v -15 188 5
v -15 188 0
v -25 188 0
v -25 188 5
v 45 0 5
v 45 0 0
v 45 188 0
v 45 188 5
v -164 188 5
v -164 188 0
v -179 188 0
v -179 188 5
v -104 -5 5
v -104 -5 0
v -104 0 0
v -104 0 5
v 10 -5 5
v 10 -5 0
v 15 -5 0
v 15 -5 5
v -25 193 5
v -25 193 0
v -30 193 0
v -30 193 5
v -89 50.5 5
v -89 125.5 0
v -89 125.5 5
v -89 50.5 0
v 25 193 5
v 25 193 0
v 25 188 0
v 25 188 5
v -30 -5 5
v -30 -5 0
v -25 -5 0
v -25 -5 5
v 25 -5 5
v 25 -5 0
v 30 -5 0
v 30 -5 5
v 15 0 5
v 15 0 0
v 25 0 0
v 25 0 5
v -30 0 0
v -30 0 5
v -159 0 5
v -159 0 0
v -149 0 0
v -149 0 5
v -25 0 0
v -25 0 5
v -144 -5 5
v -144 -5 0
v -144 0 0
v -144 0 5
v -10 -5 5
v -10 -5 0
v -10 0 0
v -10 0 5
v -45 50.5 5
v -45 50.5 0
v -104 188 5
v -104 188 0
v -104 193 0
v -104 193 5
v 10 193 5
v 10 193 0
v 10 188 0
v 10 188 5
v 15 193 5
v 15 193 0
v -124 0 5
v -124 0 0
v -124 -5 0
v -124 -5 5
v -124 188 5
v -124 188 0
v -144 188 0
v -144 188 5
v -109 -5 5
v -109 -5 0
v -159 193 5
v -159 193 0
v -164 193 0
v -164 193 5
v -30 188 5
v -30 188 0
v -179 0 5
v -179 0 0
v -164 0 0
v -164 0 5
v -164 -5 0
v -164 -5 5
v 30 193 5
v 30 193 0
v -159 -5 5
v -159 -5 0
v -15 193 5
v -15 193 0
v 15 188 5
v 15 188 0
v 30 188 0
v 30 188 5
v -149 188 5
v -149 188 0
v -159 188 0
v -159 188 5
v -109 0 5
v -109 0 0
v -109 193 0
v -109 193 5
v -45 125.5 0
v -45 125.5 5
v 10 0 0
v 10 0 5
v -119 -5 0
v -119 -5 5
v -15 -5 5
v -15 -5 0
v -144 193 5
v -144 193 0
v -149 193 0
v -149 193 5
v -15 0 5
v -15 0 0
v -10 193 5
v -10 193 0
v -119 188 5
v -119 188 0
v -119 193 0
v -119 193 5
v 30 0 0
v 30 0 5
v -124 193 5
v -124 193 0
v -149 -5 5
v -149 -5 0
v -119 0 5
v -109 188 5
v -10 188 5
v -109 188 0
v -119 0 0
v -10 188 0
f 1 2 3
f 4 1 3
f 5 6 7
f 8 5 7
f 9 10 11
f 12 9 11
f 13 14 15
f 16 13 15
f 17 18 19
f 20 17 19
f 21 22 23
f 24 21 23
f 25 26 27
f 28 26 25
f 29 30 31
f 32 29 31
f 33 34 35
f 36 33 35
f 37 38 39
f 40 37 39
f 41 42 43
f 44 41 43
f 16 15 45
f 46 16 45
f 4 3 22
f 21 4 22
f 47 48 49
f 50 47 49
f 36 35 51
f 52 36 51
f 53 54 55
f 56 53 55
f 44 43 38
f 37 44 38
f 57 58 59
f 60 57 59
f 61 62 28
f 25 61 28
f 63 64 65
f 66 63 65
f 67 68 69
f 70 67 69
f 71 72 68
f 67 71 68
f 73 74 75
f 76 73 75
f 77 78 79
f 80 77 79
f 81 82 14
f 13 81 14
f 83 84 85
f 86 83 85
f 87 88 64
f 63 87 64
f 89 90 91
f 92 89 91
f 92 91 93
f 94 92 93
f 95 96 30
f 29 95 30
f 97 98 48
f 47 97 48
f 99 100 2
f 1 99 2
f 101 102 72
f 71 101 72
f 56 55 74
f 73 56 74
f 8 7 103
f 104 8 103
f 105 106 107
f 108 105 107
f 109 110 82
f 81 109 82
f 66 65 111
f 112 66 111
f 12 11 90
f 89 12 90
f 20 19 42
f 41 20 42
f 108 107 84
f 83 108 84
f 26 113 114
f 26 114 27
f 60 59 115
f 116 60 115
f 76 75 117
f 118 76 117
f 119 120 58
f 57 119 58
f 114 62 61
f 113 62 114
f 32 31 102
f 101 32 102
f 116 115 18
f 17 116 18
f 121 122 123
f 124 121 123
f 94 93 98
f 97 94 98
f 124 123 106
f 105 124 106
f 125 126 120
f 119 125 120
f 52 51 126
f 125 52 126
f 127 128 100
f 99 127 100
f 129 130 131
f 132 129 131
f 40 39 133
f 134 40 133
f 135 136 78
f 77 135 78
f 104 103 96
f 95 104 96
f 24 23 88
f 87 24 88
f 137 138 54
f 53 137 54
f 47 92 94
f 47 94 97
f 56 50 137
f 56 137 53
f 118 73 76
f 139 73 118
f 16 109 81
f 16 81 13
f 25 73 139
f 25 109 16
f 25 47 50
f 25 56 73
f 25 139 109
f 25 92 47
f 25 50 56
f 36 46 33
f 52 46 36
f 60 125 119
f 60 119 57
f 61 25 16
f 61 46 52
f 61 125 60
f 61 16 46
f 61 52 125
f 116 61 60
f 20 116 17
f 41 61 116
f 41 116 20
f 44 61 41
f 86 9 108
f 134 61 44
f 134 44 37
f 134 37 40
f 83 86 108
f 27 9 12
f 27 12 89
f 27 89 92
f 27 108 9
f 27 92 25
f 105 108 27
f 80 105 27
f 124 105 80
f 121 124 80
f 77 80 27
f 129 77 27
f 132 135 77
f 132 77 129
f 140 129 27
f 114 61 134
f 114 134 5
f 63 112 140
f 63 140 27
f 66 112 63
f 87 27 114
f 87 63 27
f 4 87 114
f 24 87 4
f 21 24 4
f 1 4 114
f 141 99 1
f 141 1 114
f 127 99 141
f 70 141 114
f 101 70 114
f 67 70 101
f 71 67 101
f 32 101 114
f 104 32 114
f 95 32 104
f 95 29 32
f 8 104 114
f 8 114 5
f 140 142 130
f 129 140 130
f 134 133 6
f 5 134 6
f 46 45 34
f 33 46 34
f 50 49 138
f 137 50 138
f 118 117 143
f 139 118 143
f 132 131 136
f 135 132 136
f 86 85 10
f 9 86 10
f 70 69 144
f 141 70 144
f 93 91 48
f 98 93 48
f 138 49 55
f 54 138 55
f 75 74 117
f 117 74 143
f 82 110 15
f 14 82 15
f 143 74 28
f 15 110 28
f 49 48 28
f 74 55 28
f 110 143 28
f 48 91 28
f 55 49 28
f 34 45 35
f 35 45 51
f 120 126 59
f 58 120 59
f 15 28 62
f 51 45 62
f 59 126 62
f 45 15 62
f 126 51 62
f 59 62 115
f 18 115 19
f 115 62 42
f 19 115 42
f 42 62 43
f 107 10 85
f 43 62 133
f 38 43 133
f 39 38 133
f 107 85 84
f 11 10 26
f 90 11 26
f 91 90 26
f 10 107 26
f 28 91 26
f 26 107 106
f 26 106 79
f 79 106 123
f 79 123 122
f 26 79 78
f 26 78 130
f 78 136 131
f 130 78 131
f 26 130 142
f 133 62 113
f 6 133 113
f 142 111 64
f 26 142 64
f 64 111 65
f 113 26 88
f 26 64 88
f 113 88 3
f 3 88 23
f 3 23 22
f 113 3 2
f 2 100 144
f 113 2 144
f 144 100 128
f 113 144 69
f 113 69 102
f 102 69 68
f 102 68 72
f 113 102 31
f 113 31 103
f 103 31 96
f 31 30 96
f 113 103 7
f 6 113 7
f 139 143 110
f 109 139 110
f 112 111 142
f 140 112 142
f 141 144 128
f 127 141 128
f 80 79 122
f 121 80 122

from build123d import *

# Parameters (mm, degrees)
BOSS_EXTRU_1_DEPTH = 5


with BuildPart() as part:
    # Esquisse1 → Boss.-Extru.1 (new body)
    with BuildSketch(Plane.XY):
        Polygon((-30, 188), (-45, 188), (-89, 188), (-104, 188), (-104, 193), (-109, 193), (-109, 188), (-114, 188), (-119, 188), (-119, 193), (-124, 193), (-124, 188), (-144, 188), (-144, 193), (-149, 193), (-149, 188), (-154, 188), (-159, 188), (-159, 193), (-164, 193), (-164, 188), (-179, 188), (-179, 0), (-164, 0), (-164, -5), (-159, -5), (-159, 0), (-154, 0), (-149, 0), (-149, -5), (-144, -5), (-144, 0), (-124, 0), (-124, -5), (-119, -5), (-119, 0), (-114, 0), (-109, 0), (-109, -5), (-104, -5), (-104, 0), (-89, 0), (-45, 0), (-30, 0), (-30, -5), (-25, -5), (-25, 0), (-20, 0), (-15, 0), (-15, -5), (-10, -5), (-10, 0), (10, 0), (10, -5), (15, -5), (15, 0), (20, 0), (25, 0), (25, -5), (30, -5), (30, 0), (45, 0), (45, 188), (30, 188), (30, 193), (25, 193), (25, 188), (20, 188), (15, 188), (15, 193), (10, 193), (10, 188), (-10, 188), (-10, 193), (-15, 193), (-15, 188), (-20, 188), (-25, 188), (-25, 193), (-30, 193), align=None)
        Polygon((-45, 125.5), (-89, 125.5), (-89, 50.5), (-67, 50.5), (-45, 50.5), align=None, mode=Mode.SUBTRACT)
    extrude(amount=BOSS_EXTRU_1_DEPTH)


solid = part.part
